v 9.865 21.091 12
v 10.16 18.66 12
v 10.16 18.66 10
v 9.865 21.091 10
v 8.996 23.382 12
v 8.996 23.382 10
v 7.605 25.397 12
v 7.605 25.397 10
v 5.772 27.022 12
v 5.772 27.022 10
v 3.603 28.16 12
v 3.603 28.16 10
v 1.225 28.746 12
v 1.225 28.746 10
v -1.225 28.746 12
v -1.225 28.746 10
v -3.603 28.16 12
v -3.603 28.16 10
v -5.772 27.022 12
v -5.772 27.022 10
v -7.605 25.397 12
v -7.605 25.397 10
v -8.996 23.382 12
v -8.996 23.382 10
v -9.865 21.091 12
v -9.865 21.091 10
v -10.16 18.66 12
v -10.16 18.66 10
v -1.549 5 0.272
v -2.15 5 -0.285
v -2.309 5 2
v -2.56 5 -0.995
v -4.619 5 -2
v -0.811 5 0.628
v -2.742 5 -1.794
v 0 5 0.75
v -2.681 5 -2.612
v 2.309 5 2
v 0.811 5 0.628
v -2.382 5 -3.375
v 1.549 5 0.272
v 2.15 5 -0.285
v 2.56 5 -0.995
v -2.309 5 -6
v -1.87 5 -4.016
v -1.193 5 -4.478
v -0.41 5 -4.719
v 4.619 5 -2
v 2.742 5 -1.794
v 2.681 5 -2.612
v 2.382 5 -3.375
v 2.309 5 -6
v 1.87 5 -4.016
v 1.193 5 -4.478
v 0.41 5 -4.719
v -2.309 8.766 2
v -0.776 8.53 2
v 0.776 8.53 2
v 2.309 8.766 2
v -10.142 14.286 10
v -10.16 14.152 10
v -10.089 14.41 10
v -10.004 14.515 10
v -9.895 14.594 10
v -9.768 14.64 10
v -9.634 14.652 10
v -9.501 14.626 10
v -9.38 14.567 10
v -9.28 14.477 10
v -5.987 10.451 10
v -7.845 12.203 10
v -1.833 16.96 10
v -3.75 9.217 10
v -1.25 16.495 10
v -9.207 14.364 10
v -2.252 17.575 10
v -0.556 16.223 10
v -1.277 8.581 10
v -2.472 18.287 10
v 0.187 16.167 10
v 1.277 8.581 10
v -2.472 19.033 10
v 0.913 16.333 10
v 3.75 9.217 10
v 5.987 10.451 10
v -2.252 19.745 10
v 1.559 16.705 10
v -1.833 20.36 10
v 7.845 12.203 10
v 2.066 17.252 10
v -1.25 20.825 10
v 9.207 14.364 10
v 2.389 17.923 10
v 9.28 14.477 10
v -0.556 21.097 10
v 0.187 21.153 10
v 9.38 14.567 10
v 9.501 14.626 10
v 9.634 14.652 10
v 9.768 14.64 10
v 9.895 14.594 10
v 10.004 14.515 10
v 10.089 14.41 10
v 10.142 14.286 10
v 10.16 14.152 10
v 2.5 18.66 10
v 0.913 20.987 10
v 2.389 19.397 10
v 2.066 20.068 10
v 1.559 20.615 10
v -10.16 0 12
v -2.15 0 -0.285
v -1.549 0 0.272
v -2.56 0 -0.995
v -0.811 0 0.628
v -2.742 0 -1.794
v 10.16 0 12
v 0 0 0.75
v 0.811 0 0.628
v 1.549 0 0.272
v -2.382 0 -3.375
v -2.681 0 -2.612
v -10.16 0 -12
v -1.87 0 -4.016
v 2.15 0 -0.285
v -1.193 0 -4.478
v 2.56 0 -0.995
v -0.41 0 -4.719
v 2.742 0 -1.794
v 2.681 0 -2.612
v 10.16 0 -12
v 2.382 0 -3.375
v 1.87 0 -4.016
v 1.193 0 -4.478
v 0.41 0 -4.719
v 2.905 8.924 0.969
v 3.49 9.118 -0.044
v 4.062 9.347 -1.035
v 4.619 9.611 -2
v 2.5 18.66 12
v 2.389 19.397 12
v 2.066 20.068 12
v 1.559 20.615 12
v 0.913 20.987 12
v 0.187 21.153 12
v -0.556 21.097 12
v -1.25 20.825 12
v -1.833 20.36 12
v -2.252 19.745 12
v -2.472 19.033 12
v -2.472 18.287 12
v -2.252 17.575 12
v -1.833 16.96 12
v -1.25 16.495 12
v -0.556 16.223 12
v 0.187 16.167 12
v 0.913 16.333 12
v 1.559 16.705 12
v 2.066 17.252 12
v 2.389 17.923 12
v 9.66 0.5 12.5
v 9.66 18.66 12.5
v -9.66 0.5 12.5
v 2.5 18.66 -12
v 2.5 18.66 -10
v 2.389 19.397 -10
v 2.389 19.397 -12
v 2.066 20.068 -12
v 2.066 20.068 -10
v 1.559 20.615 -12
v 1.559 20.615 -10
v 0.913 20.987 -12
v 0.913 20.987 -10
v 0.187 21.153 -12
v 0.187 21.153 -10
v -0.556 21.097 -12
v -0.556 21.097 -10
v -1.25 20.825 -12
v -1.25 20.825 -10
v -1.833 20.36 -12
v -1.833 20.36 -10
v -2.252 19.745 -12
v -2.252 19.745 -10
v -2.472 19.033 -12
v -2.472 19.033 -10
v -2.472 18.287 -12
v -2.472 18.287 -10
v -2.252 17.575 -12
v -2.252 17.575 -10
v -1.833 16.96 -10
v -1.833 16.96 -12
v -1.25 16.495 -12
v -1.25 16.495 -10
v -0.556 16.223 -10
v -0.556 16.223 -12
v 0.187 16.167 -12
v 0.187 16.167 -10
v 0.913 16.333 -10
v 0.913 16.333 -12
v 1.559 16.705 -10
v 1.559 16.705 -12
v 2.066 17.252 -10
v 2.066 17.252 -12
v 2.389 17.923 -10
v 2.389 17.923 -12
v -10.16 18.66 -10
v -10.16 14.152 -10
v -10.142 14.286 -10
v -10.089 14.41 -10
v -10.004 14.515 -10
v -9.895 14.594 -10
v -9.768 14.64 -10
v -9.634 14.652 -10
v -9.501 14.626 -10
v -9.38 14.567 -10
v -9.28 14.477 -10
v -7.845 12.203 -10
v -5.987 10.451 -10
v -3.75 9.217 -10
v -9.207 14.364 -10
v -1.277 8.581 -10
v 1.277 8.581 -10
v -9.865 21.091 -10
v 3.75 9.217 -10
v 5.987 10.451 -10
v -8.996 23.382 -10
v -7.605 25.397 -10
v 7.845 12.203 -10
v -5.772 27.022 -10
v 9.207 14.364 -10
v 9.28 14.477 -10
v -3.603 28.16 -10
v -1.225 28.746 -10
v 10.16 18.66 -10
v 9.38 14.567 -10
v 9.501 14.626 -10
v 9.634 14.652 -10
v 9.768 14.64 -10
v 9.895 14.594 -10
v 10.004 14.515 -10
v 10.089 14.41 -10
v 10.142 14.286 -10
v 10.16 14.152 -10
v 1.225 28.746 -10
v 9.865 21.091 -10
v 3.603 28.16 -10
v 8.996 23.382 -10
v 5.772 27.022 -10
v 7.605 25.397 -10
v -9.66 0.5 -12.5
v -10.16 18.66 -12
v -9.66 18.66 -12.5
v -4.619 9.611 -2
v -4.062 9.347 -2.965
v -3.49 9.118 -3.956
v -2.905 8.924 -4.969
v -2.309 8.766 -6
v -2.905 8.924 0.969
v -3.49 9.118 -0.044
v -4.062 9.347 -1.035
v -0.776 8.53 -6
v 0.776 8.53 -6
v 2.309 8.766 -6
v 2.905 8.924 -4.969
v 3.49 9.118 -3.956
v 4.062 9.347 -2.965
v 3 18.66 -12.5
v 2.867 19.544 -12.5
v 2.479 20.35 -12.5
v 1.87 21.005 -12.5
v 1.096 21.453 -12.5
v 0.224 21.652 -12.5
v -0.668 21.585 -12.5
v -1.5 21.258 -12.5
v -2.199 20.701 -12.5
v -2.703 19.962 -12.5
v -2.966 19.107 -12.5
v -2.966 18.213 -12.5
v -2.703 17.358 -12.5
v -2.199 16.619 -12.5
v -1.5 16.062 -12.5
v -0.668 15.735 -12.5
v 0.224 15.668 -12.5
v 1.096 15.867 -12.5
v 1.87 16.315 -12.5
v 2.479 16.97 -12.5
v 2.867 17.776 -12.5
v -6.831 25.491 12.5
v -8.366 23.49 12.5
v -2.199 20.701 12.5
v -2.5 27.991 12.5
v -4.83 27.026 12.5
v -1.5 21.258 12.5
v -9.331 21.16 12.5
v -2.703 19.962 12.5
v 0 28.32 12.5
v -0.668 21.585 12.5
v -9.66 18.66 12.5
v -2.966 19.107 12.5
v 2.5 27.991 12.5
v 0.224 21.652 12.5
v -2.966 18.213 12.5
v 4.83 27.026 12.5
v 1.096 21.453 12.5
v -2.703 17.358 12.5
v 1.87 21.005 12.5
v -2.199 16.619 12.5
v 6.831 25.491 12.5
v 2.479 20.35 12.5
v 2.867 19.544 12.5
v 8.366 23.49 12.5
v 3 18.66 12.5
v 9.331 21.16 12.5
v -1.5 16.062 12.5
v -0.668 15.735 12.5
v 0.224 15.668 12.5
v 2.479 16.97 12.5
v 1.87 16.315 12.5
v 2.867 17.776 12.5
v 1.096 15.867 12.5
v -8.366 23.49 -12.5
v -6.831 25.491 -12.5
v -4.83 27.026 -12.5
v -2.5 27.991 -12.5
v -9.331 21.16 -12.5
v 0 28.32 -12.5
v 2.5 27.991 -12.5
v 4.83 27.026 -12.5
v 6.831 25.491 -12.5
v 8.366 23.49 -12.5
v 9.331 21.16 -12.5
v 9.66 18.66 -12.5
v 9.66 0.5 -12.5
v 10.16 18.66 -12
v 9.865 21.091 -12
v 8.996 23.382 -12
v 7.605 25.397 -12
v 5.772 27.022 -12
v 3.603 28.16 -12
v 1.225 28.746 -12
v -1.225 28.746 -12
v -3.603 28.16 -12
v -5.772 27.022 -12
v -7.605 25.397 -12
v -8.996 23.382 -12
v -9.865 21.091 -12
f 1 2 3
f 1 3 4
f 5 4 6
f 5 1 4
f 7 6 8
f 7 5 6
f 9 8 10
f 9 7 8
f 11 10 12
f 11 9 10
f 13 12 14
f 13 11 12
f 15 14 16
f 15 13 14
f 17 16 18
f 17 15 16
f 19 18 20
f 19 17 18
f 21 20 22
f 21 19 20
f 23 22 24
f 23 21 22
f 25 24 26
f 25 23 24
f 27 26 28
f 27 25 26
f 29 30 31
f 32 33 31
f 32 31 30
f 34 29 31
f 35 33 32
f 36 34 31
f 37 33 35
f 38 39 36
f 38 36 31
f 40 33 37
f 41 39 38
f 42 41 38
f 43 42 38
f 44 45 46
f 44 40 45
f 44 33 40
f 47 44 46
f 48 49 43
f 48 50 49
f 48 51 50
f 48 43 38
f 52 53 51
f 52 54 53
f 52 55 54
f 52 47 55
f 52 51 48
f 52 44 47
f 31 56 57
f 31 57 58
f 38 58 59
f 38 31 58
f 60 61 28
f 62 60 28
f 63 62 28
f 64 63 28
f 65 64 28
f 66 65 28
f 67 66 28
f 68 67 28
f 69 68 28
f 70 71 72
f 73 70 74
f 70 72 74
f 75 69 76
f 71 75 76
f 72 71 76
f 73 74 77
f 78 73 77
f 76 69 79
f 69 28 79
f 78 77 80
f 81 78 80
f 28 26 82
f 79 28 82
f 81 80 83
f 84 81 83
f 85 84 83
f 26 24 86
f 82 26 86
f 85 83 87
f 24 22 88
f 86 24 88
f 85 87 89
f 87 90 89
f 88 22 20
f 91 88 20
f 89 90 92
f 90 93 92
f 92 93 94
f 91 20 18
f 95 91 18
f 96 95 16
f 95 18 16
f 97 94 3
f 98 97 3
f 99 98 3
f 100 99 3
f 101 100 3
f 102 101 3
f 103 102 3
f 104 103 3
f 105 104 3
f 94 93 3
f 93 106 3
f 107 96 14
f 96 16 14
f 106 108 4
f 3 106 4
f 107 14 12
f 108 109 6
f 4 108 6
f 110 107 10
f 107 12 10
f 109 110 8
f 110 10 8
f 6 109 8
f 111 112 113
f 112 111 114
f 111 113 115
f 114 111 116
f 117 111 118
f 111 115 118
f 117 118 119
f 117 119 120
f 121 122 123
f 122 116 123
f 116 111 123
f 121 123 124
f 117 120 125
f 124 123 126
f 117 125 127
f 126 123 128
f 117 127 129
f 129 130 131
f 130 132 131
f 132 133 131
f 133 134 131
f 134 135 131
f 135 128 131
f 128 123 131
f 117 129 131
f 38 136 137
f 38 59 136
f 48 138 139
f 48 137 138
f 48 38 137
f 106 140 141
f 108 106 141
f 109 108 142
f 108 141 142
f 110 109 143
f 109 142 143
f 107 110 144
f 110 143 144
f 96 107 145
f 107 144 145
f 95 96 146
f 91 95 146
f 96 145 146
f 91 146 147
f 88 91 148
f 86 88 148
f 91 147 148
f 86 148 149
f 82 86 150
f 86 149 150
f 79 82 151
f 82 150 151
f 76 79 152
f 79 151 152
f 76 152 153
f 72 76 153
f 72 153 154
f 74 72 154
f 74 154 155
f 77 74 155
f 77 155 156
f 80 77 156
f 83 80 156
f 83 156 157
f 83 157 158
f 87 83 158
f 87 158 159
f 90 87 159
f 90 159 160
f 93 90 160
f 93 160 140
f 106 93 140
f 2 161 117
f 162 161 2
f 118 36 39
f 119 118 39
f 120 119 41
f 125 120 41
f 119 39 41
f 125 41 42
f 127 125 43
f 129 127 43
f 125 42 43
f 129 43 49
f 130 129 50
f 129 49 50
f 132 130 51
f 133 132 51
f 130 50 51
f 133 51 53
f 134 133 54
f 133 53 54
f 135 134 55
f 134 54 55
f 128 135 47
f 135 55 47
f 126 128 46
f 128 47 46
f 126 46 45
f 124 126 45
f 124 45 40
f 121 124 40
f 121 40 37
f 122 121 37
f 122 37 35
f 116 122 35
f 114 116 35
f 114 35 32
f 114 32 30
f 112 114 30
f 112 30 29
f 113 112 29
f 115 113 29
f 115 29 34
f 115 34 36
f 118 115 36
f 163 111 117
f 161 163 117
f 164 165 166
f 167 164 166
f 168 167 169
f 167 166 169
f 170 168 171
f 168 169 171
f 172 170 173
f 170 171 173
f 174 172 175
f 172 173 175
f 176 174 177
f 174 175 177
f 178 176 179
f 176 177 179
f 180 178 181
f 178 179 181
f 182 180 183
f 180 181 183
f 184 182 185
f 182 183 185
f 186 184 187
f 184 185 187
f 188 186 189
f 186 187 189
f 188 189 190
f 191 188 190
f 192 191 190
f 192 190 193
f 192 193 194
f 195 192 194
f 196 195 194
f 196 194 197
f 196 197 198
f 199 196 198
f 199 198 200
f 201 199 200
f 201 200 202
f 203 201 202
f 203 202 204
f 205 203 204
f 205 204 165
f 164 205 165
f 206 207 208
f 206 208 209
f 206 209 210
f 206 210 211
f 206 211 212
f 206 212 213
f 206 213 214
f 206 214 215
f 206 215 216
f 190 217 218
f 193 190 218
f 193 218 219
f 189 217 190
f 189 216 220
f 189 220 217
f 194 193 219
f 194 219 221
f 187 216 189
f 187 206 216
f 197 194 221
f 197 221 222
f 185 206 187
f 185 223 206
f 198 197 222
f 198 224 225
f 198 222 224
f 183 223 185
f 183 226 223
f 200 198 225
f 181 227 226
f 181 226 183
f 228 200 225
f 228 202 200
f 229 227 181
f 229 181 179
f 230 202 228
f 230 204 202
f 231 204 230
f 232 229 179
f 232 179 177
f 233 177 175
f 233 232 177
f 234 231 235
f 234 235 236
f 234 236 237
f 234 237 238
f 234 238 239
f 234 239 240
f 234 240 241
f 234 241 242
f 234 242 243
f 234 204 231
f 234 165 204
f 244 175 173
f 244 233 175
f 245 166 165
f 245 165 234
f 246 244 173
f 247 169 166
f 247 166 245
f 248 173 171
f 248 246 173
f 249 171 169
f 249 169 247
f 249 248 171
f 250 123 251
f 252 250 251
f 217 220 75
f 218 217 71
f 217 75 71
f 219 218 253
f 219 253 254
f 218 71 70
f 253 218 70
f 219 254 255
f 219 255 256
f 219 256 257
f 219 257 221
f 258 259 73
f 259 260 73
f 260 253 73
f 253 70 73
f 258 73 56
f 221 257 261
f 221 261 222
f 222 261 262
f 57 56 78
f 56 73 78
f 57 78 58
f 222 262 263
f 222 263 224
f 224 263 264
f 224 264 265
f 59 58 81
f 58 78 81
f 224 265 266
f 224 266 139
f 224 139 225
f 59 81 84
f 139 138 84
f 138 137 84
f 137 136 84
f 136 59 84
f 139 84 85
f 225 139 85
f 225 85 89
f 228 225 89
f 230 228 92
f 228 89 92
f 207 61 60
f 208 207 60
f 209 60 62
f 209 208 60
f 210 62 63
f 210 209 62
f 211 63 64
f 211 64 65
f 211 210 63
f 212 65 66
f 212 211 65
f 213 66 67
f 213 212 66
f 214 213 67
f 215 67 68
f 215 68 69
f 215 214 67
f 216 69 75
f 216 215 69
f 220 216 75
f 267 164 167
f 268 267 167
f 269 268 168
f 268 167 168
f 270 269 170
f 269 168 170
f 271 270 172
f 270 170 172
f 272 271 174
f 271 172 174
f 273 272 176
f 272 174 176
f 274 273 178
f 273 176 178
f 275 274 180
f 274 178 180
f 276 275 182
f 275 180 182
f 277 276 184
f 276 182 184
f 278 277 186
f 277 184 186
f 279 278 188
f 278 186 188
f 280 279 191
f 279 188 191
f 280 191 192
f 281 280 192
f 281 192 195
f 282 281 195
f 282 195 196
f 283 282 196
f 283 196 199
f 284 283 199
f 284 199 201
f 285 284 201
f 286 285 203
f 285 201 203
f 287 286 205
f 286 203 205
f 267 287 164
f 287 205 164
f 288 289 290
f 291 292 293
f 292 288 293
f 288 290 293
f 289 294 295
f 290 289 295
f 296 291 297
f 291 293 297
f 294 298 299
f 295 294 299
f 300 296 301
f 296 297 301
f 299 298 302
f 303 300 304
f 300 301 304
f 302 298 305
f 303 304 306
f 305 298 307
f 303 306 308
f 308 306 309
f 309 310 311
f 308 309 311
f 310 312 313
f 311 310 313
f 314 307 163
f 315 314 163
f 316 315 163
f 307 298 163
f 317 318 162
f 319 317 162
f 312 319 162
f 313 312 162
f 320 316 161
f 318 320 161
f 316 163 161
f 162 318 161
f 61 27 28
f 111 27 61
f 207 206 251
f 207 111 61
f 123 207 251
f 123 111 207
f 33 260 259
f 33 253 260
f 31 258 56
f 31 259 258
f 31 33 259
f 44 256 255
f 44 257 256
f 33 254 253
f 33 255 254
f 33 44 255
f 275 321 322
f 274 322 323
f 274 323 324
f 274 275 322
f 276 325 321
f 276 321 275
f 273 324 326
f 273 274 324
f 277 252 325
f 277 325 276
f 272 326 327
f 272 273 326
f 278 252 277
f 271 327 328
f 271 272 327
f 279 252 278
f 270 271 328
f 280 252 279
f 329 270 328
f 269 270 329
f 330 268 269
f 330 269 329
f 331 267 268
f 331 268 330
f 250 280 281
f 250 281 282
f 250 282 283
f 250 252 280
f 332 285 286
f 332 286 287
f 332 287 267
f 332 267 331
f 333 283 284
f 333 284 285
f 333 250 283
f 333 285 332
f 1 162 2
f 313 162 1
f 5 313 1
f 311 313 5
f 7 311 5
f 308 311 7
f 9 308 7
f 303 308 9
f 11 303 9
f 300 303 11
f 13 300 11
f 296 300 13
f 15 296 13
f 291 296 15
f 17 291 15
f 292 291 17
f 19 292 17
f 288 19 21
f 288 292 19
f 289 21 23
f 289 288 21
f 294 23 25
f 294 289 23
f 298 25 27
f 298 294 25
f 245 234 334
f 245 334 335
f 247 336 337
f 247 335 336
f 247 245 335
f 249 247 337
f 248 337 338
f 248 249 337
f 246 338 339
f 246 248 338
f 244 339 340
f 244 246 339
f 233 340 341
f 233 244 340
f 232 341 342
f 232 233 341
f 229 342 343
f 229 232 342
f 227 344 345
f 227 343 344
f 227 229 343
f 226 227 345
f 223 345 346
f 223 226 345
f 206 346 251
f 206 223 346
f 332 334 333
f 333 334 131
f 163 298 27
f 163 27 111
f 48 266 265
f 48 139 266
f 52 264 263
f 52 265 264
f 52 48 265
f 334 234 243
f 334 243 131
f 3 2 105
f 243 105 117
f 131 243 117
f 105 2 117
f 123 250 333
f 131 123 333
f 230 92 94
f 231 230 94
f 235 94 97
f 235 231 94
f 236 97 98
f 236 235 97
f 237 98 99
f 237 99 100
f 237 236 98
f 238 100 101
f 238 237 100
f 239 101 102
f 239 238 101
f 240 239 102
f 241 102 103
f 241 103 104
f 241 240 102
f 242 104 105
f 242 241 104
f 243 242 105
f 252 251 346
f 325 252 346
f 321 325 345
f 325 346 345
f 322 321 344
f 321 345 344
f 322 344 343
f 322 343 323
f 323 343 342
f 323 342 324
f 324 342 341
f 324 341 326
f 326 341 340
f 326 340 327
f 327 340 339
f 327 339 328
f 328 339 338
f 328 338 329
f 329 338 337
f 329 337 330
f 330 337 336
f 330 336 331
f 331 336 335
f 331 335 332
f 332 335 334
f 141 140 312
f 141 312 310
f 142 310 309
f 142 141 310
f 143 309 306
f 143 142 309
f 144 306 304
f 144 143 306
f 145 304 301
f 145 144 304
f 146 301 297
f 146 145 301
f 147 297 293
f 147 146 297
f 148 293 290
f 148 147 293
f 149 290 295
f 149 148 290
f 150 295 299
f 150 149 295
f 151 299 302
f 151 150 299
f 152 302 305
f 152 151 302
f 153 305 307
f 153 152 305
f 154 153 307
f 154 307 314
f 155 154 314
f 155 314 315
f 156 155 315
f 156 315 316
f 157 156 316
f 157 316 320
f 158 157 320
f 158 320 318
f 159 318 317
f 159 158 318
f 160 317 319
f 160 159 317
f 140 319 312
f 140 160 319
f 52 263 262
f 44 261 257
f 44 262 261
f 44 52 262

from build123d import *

# Parameters (mm, degrees)
SKETCH1_W               = 20.32
SKETCH1_H               = 25
BOSS_EXTRUDE1_DEPTH     = 28.82
SKETCH2_W               = 20
SKETCH2_H               = 20.32
CUT_EXTRUDE1_DEPTH      = 38.413163459
SKETCH3_R               = 2.5
CUT_EXTRUDE2_DEPTH      = 28.82
BOSS_EXTRUDE2_START     = 20
BOSS_EXTRUDE2_DEPTH     = 20
FILLET1_START           = -10
FILLET1_DEPTH           = 20
CUT_EXTRUDE3_DEPTH      = 34.016177853
CUT_EXTRUDE3_DEPTH_BACK = 3.5
CUT_EXTRUDE3_START      = 8.5
SKETCH5_R               = 2.75
CUT_EXTRUDE4_DEPTH      = 29.755312553
CHAMFER1_SIZE           = 0.5


with BuildPart() as part:
    # Sketch1 → Boss-Extrude1 (new body)
    with BuildSketch(Plane(origin=(0, 0, 0), x_dir=(1, 0, 0), z_dir=(0, 1, 0))):
        Rectangle(SKETCH1_W, SKETCH1_H)
    extrude(amount=BOSS_EXTRUDE1_DEPTH)

    # Sketch2 → Cut-Extrude1 (cut, through all)
    with BuildSketch(Plane(origin=(10.16, 0, 0), x_dir=(0, 0, -1), z_dir=(1, 0, 0))):
        with Locations((0, 18.66)):
            Rectangle(SKETCH2_W, SKETCH2_H)
    extrude(amount=-CUT_EXTRUDE1_DEPTH, mode=Mode.SUBTRACT)

    # Sketch3 → Cut-Extrude2 (cut)
    with BuildSketch(Plane.XY.offset(12.5)):
        with Locations((0, 18.66)):
            Circle(SKETCH3_R)
        with BuildLine():
            Line((-10.16, 18.66), (-10.16, 30.66))
            Line((-10.16, 30.66), (10.16, 30.66))
            Line((10.16, 30.66), (10.16, 18.66))
            ThreePointArc((10.16, 18.66), (0, 28.82), (-10.16, 18.66))
        make_face()
    extrude(amount=-CUT_EXTRUDE2_DEPTH, mode=Mode.SUBTRACT)

    # Sketch7 → Boss-Extrude2 (add)
    with BuildSketch(Plane.XY.offset(-10).offset(BOSS_EXTRUDE2_START)):
        with BuildLine():
            Line((10.16, 18.66), (10.16, 0))
            Line((10.16, 0), (-10.16, 0))
            Line((-10.16, 0), (-10.16, 18.66))
            ThreePointArc((-10.16, 18.66), (0, 8.5), (10.16, 18.66))
        make_face()
    extrude(amount=-BOSS_EXTRUDE2_DEPTH)

    # Fillet1: read off the stored shape, not the designer's step
    # Fillet1 outline → Fillet1 (cut)
    with BuildSketch(Plane.XY.offset(FILLET1_START)):
        with BuildLine():
            ThreePointArc((10.16, 18.66), (9.918864548, 16.459607744), (9.206904315, 14.363662847))
            ThreePointArc((9.206904315, 14.363662847), (9.76828702, 14.64036203), (10.16, 14.152228932))
            Line((10.16, 14.152228932), (10.16, 18.66))
        make_face()
        with BuildLine():
            ThreePointArc((-10.16, 14.152228932), (-9.76828702, 14.64036203), (-9.206904315, 14.363662847))
            ThreePointArc((-9.206904315, 14.363662847), (-9.918864548, 16.459607744), (-10.16, 18.66))
            Line((-10.16, 18.66), (-10.16, 14.152228932))
        make_face()
    extrude(amount=FILLET1_DEPTH, mode=Mode.SUBTRACT)

    # Sketch4 → Cut-Extrude3 (cut, two sides: drawn at the far end of the back side and taken through both)
    with BuildSketch(Plane(origin=(0, 0, 0), x_dir=(1, 0, 0), z_dir=(0, 1, 0)).offset(CUT_EXTRUDE3_START - CUT_EXTRUDE3_DEPTH_BACK)):
        Polygon((4.618802154, 2), (2.309401077, 6), (-2.309401077, 6), (-4.618802154, 2), (-2.309401077, -2), (2.309401077, -2), align=None)
    extrude(amount=CUT_EXTRUDE3_DEPTH + CUT_EXTRUDE3_DEPTH_BACK, mode=Mode.SUBTRACT)

    # Sketch5 → Cut-Extrude4 (cut, through all)
    with BuildSketch(Plane(origin=(0, 5, 0), x_dir=(1, 0, 0), z_dir=(0, 1, 0))):
        with Locations(Location((0, 2, 0), (0, 0, 270))):
            Circle(SKETCH5_R)
    extrude(amount=-CUT_EXTRUDE4_DEPTH, mode=Mode.SUBTRACT)

    # Chamfer1
    chamfer1_edges = [part.edges().sort_by_distance(p)[0] for p in [
        (10.16, 9.33, 12.5),
        (-10.16, 9.33, 12.5),
        (-10.16, 9.33, -12.5),
        (10.16, 9.33, -12.5),
        (-2.5, 18.66, -12.5),
        (-2.5, 18.66, 12.5),
        (0, 28.82, 12.5),
        (0, 28.82, -12.5),
        (0, 0, 12.5),
        (0, 0, -12.5),
    ]]
    chamfer(chamfer1_edges, length=CHAMFER1_SIZE)


solid = part.part
